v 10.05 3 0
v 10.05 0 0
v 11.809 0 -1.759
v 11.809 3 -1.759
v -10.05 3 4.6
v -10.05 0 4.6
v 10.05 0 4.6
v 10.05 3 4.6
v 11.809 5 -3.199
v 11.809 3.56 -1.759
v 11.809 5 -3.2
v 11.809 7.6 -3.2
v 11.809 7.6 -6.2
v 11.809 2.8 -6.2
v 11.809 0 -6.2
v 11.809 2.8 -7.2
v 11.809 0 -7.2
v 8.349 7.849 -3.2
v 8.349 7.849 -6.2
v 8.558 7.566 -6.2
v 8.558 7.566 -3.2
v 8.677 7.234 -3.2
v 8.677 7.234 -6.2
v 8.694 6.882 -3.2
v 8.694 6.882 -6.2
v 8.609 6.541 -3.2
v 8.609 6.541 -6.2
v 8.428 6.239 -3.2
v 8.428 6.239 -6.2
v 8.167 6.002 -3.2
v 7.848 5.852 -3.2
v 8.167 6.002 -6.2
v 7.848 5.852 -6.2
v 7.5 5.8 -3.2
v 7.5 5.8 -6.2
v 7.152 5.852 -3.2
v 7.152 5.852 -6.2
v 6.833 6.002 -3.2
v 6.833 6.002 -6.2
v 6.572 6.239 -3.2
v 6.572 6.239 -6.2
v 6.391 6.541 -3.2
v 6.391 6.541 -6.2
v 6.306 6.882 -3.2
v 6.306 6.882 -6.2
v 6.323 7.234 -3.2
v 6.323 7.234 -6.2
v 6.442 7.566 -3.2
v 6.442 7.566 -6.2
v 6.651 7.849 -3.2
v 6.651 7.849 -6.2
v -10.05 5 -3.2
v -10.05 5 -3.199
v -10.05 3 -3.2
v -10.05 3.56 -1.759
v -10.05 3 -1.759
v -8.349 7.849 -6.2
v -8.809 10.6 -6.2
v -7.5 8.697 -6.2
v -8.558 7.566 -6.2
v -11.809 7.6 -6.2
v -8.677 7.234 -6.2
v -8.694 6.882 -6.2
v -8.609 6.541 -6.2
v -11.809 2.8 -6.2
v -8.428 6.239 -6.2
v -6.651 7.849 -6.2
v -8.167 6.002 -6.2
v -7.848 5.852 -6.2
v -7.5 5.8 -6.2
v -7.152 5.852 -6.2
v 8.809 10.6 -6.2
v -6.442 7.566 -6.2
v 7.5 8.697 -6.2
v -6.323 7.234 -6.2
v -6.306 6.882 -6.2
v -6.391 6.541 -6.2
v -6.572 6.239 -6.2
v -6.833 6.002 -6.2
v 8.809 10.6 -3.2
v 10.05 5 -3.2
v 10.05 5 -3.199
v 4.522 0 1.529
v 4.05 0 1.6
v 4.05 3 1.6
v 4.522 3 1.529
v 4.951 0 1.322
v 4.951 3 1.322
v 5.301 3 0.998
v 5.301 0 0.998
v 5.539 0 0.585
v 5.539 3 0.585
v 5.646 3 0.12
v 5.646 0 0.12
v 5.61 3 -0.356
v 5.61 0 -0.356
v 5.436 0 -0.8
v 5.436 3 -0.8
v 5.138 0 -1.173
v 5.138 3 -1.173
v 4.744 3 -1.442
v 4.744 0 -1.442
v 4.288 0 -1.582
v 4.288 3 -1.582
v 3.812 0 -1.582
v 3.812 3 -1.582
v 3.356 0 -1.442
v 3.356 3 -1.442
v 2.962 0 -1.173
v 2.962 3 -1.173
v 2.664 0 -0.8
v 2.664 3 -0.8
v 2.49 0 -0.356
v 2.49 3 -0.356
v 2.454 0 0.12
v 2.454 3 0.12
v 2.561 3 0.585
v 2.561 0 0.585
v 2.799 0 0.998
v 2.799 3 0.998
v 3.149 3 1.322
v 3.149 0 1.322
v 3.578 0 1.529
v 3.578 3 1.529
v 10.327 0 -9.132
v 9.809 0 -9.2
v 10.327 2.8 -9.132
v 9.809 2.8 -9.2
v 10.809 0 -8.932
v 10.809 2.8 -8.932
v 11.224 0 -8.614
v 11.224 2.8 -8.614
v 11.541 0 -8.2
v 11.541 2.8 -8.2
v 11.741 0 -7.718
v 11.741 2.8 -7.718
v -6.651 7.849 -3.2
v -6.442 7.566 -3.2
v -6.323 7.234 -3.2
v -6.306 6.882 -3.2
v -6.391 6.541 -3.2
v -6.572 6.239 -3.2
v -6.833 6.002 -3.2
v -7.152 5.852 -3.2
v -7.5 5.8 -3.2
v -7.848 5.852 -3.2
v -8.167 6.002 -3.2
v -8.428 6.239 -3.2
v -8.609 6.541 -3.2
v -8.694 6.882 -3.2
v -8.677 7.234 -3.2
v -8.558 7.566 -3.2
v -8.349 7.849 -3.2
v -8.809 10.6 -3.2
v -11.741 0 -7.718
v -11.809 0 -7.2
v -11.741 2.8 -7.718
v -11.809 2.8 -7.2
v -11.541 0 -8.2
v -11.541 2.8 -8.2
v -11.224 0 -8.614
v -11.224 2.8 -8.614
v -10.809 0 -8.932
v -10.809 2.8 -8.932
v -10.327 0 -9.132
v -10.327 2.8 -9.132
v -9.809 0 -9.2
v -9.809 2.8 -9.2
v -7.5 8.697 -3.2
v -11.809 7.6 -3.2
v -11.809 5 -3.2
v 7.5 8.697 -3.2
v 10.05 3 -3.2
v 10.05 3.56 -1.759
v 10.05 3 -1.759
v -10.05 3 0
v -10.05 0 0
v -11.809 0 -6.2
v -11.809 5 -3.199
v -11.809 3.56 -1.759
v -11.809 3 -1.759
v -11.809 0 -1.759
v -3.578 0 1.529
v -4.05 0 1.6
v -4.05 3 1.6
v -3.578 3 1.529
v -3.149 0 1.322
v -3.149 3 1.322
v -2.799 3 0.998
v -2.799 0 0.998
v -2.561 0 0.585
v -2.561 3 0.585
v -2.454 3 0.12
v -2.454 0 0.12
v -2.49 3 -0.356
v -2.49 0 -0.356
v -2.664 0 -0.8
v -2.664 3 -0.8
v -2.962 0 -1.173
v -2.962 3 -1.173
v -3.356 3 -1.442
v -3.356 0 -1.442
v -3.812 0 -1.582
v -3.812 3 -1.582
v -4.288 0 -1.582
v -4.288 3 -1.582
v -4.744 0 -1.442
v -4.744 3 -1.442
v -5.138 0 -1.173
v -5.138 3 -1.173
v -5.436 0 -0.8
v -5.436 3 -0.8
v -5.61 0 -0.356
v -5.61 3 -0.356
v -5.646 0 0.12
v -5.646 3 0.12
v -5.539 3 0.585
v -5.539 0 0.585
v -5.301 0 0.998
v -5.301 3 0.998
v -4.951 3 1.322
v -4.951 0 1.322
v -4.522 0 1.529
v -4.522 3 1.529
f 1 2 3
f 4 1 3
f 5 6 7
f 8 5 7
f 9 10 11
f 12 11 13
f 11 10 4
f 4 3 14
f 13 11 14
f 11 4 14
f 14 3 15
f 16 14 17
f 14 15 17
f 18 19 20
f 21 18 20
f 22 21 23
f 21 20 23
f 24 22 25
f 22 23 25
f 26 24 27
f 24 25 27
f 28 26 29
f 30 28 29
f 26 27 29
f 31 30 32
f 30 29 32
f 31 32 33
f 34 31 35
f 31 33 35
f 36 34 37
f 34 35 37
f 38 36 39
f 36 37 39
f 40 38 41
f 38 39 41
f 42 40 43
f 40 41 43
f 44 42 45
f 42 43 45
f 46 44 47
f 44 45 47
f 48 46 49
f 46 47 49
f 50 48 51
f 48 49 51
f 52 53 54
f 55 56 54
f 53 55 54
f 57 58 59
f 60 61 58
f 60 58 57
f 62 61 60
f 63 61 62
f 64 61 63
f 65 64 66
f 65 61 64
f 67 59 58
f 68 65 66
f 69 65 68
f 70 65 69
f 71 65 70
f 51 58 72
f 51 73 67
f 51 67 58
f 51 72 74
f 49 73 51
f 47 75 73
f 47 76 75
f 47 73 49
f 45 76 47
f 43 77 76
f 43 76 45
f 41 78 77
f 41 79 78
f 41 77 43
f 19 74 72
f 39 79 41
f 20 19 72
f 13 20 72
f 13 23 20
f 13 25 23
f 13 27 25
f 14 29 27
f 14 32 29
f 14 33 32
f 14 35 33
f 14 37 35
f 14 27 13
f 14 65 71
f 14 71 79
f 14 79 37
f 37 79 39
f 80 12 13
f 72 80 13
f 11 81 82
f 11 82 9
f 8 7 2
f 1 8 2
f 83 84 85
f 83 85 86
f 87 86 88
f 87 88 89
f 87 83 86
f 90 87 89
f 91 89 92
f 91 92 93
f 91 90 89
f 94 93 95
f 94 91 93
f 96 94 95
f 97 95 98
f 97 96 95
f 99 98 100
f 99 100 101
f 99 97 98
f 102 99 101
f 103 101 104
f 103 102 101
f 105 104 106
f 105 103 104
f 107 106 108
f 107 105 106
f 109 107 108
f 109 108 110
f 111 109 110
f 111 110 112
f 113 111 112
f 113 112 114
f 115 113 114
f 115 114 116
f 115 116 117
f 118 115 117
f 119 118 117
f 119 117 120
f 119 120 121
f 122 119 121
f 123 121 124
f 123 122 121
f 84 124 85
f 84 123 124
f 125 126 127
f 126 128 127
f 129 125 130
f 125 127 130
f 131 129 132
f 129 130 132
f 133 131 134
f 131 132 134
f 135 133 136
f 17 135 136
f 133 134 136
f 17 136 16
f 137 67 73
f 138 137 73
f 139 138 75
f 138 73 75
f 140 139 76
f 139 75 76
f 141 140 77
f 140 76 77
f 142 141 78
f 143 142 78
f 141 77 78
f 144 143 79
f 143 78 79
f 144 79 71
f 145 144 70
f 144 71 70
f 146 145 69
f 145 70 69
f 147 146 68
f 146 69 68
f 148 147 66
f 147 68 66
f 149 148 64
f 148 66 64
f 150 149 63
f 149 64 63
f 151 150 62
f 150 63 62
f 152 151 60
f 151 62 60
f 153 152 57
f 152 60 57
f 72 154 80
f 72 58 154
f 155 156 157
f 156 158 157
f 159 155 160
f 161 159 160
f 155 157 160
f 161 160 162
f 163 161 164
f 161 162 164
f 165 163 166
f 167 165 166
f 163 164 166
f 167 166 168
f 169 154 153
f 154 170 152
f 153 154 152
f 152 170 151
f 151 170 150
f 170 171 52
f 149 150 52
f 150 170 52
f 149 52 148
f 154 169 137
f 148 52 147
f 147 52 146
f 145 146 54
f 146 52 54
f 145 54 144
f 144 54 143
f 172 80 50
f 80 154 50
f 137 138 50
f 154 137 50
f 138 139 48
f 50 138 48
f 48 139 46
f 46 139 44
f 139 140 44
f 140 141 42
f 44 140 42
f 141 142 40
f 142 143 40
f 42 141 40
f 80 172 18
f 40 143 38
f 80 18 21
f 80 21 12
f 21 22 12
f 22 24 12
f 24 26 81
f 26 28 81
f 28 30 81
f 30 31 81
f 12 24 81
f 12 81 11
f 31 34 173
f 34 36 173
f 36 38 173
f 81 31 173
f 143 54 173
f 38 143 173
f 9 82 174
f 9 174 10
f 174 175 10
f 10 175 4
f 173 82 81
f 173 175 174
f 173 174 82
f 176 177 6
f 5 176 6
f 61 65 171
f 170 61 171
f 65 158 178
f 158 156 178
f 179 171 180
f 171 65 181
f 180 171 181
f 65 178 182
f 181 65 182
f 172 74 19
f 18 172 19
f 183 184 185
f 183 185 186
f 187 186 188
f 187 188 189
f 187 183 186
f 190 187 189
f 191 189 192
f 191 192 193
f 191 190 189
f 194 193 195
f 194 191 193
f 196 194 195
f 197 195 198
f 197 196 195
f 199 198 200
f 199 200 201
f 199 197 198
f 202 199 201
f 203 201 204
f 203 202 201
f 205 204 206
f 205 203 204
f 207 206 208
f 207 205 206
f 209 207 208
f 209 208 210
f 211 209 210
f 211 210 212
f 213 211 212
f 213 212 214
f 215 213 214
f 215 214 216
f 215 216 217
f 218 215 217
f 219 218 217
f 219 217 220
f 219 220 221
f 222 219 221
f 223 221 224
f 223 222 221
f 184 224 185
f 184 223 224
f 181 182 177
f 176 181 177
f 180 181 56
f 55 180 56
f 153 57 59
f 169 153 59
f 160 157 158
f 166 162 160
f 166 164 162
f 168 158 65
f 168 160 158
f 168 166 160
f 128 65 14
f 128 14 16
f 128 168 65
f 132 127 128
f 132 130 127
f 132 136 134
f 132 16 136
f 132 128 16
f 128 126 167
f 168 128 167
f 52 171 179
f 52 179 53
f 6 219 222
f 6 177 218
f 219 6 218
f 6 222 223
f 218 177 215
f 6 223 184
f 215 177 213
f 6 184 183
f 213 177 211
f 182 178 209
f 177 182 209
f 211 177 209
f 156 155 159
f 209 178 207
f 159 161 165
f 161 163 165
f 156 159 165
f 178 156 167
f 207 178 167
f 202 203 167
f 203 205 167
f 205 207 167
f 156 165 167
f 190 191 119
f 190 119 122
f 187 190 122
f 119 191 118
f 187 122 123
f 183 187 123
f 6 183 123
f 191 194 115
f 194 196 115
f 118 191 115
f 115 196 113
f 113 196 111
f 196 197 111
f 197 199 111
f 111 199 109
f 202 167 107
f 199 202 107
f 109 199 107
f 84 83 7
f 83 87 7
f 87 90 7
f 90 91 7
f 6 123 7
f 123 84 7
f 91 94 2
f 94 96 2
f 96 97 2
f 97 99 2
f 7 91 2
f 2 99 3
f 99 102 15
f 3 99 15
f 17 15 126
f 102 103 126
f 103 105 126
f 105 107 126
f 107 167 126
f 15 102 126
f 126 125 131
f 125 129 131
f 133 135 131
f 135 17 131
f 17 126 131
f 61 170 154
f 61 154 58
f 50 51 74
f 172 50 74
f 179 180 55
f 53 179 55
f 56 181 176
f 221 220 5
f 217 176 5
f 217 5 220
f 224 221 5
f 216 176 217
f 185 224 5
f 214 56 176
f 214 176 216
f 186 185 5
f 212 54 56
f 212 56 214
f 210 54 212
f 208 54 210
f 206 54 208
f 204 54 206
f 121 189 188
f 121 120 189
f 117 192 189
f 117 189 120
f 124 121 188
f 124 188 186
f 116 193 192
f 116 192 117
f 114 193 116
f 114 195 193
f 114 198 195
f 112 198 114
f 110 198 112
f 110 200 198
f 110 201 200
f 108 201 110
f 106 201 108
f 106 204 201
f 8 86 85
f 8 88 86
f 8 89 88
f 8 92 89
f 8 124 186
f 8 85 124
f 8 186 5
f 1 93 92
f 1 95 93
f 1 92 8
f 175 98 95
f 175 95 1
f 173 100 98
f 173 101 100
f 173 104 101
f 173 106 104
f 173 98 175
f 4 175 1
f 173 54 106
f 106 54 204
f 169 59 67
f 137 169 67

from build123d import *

# Parameters (mm, degrees)
SKETCH1_R               = 3.2
BOSS_EXTRUDE1_DEPTH     = 3
SKETCH1_3_R             = 3.2
SKETCH1_3_R_2           = 1.6
BOSS_EXTRUDE2_DEPTH     = 3
BOSS_EXTRUDE3_OUTLINE_W = 23.618802154
BOSS_EXTRUDE3_OUTLINE_H = 3
BOSS_EXTRUDE3_DEPTH     = 10.6
SKETCH3_R               = 1.2
CUT_EXTRUDE4_DEPTH      = 3
SKETCH1_7_W             = 1.759401077
SKETCH1_7_H             = 1.440598923
BOSS_EXTRUDE5_DEPTH     = 5
CHAMFER1_SIZE           = 1.44
CHAMFER2_SIZE           = 3
BOSS_EXTRUDE6_DEPTH     = 2.8
FILLET1_R               = 2


# Read off the part's stored shape, not the designer's step: Boss-Extrude3
with BuildPart() as part:
    # Sketch1 → Boss-Extrude1 (new body)
    with BuildSketch(Plane(origin=(0, 0, 0), x_dir=(1, 0, 0), z_dir=(0, 1, 0))):
        Polygon((11.809401077, 3.2), (10.05, 3.2), (10.05, 6.2), (-10.05, 6.2), (-10.05, 3.2), (-11.809401077, 3.2), (-11.809401077, 1.759401077), (-10.05, 0), (-10.05, -4.6), (10.05, -4.6), (10.05, 0), (11.809401077, 1.759401077), align=None)
        with Locations(Location((-4.05, 0, 0), (0, 0, 270))):
            Circle(SKETCH1_R, mode=Mode.SUBTRACT)
        with Locations(Location((4.05, 0, 0), (0, 0, 270))):
            Circle(SKETCH1_R, mode=Mode.SUBTRACT)
    extrude(amount=BOSS_EXTRUDE1_DEPTH)

    # Sketch1<3> → Boss-Extrude2 (add)
    # profile 1 of 2: a face of its own
    with BuildSketch(Plane(origin=(0, 0, 0), x_dir=(1, 0, 0), z_dir=(0, 1, 0))):
        with Locations((-4.05, 0)):
            Circle(SKETCH1_3_R)
        with Locations(Location((-4.05, 0, 0), (0, 0, 270))):
            Circle(SKETCH1_3_R_2, mode=Mode.SUBTRACT)
    # profile 2 of 2: a face of its own
    with BuildSketch(Plane(origin=(0, 0, 0), x_dir=(1, 0, 0), z_dir=(0, 1, 0))):
        with Locations((4.05, 0)):
            Circle(SKETCH1_3_R)
        with Locations(Location((4.05, 0, 0), (0, 0, 270))):
            Circle(SKETCH1_3_R_2, mode=Mode.SUBTRACT)
    extrude(amount=BOSS_EXTRUDE2_DEPTH)

    # Boss-Extrude3 outline → Boss-Extrude3 (add)
    with BuildSketch(Plane(origin=(0, 0, 0), x_dir=(1, 0, 0), z_dir=(0, 1, 0))):
        with Locations((0, 4.7)):
            Rectangle(BOSS_EXTRUDE3_OUTLINE_W, BOSS_EXTRUDE3_OUTLINE_H)
    extrude(amount=BOSS_EXTRUDE3_DEPTH)

    # Sketch3 → Cut-Extrude4 (cut)
    with BuildSketch(Plane(origin=(0, 0, -6.2), x_dir=(-1, 0, 0), z_dir=(0, 0, -1))):
        with Locations((-7.5, 7)):
            Circle(SKETCH3_R)
        with Locations((7.5, 7)):
            Circle(SKETCH3_R)
        with BuildLine():
            Line((-6.651471863, 7.848528137), (-7.5, 8.697056275))
            Line((-7.5, 8.697056275), (-8.348528137, 7.848528137))
            ThreePointArc((-8.348528137, 7.848528137), (-7.5, 8.2), (-6.651471863, 7.848528137))
        make_face()
        with BuildLine():
            Line((8.348528137, 7.848528137), (7.5, 8.697056275))
            Line((7.5, 8.697056275), (6.651471863, 7.848528137))
            ThreePointArc((6.651471863, 7.848528137), (7.5, 8.2), (8.348528137, 7.848528137))
        make_face()
    extrude(amount=-CUT_EXTRUDE4_DEPTH, mode=Mode.SUBTRACT)

    # Sketch1<7> → Boss-Extrude5 (add)
    with BuildSketch(Plane(origin=(0, 0, 0), x_dir=(1, 0, 0), z_dir=(0, 1, 0))):
        with Locations((-10.929700539, 2.479700539)):
            Rectangle(SKETCH1_7_W, SKETCH1_7_H)
        with Locations((10.929700539, 2.479700539)):
            Rectangle(SKETCH1_7_W, SKETCH1_7_H)
    extrude(amount=BOSS_EXTRUDE5_DEPTH)

    # Chamfer1
    chamfer1_edges = [part.edges().sort_by_distance(p)[0] for p in [
        (-10.929700538, 5, -1.759401077),
        (10.929700538, 5, -1.759401077),
    ]]
    chamfer(chamfer1_edges, length=CHAMFER1_SIZE)

    # Chamfer2
    chamfer2_edges = [part.edges().sort_by_distance(p)[0] for p in [
        (-11.809401077, 10.6, -4.7),
        (11.809401077, 10.6, -4.7),
    ]]
    chamfer(chamfer2_edges, length=CHAMFER2_SIZE)

    # Sketch1<8> → Boss-Extrude6 (add)
    with BuildSketch(Plane(origin=(0, 0, 0), x_dir=(1, 0, 0), z_dir=(0, 1, 0))):
        Polygon((-11.809401077, 9.2), (-11.809401077, 6.2), (-10.05, 6.2), (10.05, 6.2), (11.809401077, 6.2), (11.809401077, 9.2), align=None)
    extrude(amount=BOSS_EXTRUDE6_DEPTH)

    # Fillet1
    fillet1_edges = [part.edges().sort_by_distance(p)[0] for p in [
        (11.809401077, 1.4, -9.2),
        (-11.809401077, 1.4, -9.2),
    ]]
    fillet(fillet1_edges, radius=FILLET1_R)


solid = part.part
